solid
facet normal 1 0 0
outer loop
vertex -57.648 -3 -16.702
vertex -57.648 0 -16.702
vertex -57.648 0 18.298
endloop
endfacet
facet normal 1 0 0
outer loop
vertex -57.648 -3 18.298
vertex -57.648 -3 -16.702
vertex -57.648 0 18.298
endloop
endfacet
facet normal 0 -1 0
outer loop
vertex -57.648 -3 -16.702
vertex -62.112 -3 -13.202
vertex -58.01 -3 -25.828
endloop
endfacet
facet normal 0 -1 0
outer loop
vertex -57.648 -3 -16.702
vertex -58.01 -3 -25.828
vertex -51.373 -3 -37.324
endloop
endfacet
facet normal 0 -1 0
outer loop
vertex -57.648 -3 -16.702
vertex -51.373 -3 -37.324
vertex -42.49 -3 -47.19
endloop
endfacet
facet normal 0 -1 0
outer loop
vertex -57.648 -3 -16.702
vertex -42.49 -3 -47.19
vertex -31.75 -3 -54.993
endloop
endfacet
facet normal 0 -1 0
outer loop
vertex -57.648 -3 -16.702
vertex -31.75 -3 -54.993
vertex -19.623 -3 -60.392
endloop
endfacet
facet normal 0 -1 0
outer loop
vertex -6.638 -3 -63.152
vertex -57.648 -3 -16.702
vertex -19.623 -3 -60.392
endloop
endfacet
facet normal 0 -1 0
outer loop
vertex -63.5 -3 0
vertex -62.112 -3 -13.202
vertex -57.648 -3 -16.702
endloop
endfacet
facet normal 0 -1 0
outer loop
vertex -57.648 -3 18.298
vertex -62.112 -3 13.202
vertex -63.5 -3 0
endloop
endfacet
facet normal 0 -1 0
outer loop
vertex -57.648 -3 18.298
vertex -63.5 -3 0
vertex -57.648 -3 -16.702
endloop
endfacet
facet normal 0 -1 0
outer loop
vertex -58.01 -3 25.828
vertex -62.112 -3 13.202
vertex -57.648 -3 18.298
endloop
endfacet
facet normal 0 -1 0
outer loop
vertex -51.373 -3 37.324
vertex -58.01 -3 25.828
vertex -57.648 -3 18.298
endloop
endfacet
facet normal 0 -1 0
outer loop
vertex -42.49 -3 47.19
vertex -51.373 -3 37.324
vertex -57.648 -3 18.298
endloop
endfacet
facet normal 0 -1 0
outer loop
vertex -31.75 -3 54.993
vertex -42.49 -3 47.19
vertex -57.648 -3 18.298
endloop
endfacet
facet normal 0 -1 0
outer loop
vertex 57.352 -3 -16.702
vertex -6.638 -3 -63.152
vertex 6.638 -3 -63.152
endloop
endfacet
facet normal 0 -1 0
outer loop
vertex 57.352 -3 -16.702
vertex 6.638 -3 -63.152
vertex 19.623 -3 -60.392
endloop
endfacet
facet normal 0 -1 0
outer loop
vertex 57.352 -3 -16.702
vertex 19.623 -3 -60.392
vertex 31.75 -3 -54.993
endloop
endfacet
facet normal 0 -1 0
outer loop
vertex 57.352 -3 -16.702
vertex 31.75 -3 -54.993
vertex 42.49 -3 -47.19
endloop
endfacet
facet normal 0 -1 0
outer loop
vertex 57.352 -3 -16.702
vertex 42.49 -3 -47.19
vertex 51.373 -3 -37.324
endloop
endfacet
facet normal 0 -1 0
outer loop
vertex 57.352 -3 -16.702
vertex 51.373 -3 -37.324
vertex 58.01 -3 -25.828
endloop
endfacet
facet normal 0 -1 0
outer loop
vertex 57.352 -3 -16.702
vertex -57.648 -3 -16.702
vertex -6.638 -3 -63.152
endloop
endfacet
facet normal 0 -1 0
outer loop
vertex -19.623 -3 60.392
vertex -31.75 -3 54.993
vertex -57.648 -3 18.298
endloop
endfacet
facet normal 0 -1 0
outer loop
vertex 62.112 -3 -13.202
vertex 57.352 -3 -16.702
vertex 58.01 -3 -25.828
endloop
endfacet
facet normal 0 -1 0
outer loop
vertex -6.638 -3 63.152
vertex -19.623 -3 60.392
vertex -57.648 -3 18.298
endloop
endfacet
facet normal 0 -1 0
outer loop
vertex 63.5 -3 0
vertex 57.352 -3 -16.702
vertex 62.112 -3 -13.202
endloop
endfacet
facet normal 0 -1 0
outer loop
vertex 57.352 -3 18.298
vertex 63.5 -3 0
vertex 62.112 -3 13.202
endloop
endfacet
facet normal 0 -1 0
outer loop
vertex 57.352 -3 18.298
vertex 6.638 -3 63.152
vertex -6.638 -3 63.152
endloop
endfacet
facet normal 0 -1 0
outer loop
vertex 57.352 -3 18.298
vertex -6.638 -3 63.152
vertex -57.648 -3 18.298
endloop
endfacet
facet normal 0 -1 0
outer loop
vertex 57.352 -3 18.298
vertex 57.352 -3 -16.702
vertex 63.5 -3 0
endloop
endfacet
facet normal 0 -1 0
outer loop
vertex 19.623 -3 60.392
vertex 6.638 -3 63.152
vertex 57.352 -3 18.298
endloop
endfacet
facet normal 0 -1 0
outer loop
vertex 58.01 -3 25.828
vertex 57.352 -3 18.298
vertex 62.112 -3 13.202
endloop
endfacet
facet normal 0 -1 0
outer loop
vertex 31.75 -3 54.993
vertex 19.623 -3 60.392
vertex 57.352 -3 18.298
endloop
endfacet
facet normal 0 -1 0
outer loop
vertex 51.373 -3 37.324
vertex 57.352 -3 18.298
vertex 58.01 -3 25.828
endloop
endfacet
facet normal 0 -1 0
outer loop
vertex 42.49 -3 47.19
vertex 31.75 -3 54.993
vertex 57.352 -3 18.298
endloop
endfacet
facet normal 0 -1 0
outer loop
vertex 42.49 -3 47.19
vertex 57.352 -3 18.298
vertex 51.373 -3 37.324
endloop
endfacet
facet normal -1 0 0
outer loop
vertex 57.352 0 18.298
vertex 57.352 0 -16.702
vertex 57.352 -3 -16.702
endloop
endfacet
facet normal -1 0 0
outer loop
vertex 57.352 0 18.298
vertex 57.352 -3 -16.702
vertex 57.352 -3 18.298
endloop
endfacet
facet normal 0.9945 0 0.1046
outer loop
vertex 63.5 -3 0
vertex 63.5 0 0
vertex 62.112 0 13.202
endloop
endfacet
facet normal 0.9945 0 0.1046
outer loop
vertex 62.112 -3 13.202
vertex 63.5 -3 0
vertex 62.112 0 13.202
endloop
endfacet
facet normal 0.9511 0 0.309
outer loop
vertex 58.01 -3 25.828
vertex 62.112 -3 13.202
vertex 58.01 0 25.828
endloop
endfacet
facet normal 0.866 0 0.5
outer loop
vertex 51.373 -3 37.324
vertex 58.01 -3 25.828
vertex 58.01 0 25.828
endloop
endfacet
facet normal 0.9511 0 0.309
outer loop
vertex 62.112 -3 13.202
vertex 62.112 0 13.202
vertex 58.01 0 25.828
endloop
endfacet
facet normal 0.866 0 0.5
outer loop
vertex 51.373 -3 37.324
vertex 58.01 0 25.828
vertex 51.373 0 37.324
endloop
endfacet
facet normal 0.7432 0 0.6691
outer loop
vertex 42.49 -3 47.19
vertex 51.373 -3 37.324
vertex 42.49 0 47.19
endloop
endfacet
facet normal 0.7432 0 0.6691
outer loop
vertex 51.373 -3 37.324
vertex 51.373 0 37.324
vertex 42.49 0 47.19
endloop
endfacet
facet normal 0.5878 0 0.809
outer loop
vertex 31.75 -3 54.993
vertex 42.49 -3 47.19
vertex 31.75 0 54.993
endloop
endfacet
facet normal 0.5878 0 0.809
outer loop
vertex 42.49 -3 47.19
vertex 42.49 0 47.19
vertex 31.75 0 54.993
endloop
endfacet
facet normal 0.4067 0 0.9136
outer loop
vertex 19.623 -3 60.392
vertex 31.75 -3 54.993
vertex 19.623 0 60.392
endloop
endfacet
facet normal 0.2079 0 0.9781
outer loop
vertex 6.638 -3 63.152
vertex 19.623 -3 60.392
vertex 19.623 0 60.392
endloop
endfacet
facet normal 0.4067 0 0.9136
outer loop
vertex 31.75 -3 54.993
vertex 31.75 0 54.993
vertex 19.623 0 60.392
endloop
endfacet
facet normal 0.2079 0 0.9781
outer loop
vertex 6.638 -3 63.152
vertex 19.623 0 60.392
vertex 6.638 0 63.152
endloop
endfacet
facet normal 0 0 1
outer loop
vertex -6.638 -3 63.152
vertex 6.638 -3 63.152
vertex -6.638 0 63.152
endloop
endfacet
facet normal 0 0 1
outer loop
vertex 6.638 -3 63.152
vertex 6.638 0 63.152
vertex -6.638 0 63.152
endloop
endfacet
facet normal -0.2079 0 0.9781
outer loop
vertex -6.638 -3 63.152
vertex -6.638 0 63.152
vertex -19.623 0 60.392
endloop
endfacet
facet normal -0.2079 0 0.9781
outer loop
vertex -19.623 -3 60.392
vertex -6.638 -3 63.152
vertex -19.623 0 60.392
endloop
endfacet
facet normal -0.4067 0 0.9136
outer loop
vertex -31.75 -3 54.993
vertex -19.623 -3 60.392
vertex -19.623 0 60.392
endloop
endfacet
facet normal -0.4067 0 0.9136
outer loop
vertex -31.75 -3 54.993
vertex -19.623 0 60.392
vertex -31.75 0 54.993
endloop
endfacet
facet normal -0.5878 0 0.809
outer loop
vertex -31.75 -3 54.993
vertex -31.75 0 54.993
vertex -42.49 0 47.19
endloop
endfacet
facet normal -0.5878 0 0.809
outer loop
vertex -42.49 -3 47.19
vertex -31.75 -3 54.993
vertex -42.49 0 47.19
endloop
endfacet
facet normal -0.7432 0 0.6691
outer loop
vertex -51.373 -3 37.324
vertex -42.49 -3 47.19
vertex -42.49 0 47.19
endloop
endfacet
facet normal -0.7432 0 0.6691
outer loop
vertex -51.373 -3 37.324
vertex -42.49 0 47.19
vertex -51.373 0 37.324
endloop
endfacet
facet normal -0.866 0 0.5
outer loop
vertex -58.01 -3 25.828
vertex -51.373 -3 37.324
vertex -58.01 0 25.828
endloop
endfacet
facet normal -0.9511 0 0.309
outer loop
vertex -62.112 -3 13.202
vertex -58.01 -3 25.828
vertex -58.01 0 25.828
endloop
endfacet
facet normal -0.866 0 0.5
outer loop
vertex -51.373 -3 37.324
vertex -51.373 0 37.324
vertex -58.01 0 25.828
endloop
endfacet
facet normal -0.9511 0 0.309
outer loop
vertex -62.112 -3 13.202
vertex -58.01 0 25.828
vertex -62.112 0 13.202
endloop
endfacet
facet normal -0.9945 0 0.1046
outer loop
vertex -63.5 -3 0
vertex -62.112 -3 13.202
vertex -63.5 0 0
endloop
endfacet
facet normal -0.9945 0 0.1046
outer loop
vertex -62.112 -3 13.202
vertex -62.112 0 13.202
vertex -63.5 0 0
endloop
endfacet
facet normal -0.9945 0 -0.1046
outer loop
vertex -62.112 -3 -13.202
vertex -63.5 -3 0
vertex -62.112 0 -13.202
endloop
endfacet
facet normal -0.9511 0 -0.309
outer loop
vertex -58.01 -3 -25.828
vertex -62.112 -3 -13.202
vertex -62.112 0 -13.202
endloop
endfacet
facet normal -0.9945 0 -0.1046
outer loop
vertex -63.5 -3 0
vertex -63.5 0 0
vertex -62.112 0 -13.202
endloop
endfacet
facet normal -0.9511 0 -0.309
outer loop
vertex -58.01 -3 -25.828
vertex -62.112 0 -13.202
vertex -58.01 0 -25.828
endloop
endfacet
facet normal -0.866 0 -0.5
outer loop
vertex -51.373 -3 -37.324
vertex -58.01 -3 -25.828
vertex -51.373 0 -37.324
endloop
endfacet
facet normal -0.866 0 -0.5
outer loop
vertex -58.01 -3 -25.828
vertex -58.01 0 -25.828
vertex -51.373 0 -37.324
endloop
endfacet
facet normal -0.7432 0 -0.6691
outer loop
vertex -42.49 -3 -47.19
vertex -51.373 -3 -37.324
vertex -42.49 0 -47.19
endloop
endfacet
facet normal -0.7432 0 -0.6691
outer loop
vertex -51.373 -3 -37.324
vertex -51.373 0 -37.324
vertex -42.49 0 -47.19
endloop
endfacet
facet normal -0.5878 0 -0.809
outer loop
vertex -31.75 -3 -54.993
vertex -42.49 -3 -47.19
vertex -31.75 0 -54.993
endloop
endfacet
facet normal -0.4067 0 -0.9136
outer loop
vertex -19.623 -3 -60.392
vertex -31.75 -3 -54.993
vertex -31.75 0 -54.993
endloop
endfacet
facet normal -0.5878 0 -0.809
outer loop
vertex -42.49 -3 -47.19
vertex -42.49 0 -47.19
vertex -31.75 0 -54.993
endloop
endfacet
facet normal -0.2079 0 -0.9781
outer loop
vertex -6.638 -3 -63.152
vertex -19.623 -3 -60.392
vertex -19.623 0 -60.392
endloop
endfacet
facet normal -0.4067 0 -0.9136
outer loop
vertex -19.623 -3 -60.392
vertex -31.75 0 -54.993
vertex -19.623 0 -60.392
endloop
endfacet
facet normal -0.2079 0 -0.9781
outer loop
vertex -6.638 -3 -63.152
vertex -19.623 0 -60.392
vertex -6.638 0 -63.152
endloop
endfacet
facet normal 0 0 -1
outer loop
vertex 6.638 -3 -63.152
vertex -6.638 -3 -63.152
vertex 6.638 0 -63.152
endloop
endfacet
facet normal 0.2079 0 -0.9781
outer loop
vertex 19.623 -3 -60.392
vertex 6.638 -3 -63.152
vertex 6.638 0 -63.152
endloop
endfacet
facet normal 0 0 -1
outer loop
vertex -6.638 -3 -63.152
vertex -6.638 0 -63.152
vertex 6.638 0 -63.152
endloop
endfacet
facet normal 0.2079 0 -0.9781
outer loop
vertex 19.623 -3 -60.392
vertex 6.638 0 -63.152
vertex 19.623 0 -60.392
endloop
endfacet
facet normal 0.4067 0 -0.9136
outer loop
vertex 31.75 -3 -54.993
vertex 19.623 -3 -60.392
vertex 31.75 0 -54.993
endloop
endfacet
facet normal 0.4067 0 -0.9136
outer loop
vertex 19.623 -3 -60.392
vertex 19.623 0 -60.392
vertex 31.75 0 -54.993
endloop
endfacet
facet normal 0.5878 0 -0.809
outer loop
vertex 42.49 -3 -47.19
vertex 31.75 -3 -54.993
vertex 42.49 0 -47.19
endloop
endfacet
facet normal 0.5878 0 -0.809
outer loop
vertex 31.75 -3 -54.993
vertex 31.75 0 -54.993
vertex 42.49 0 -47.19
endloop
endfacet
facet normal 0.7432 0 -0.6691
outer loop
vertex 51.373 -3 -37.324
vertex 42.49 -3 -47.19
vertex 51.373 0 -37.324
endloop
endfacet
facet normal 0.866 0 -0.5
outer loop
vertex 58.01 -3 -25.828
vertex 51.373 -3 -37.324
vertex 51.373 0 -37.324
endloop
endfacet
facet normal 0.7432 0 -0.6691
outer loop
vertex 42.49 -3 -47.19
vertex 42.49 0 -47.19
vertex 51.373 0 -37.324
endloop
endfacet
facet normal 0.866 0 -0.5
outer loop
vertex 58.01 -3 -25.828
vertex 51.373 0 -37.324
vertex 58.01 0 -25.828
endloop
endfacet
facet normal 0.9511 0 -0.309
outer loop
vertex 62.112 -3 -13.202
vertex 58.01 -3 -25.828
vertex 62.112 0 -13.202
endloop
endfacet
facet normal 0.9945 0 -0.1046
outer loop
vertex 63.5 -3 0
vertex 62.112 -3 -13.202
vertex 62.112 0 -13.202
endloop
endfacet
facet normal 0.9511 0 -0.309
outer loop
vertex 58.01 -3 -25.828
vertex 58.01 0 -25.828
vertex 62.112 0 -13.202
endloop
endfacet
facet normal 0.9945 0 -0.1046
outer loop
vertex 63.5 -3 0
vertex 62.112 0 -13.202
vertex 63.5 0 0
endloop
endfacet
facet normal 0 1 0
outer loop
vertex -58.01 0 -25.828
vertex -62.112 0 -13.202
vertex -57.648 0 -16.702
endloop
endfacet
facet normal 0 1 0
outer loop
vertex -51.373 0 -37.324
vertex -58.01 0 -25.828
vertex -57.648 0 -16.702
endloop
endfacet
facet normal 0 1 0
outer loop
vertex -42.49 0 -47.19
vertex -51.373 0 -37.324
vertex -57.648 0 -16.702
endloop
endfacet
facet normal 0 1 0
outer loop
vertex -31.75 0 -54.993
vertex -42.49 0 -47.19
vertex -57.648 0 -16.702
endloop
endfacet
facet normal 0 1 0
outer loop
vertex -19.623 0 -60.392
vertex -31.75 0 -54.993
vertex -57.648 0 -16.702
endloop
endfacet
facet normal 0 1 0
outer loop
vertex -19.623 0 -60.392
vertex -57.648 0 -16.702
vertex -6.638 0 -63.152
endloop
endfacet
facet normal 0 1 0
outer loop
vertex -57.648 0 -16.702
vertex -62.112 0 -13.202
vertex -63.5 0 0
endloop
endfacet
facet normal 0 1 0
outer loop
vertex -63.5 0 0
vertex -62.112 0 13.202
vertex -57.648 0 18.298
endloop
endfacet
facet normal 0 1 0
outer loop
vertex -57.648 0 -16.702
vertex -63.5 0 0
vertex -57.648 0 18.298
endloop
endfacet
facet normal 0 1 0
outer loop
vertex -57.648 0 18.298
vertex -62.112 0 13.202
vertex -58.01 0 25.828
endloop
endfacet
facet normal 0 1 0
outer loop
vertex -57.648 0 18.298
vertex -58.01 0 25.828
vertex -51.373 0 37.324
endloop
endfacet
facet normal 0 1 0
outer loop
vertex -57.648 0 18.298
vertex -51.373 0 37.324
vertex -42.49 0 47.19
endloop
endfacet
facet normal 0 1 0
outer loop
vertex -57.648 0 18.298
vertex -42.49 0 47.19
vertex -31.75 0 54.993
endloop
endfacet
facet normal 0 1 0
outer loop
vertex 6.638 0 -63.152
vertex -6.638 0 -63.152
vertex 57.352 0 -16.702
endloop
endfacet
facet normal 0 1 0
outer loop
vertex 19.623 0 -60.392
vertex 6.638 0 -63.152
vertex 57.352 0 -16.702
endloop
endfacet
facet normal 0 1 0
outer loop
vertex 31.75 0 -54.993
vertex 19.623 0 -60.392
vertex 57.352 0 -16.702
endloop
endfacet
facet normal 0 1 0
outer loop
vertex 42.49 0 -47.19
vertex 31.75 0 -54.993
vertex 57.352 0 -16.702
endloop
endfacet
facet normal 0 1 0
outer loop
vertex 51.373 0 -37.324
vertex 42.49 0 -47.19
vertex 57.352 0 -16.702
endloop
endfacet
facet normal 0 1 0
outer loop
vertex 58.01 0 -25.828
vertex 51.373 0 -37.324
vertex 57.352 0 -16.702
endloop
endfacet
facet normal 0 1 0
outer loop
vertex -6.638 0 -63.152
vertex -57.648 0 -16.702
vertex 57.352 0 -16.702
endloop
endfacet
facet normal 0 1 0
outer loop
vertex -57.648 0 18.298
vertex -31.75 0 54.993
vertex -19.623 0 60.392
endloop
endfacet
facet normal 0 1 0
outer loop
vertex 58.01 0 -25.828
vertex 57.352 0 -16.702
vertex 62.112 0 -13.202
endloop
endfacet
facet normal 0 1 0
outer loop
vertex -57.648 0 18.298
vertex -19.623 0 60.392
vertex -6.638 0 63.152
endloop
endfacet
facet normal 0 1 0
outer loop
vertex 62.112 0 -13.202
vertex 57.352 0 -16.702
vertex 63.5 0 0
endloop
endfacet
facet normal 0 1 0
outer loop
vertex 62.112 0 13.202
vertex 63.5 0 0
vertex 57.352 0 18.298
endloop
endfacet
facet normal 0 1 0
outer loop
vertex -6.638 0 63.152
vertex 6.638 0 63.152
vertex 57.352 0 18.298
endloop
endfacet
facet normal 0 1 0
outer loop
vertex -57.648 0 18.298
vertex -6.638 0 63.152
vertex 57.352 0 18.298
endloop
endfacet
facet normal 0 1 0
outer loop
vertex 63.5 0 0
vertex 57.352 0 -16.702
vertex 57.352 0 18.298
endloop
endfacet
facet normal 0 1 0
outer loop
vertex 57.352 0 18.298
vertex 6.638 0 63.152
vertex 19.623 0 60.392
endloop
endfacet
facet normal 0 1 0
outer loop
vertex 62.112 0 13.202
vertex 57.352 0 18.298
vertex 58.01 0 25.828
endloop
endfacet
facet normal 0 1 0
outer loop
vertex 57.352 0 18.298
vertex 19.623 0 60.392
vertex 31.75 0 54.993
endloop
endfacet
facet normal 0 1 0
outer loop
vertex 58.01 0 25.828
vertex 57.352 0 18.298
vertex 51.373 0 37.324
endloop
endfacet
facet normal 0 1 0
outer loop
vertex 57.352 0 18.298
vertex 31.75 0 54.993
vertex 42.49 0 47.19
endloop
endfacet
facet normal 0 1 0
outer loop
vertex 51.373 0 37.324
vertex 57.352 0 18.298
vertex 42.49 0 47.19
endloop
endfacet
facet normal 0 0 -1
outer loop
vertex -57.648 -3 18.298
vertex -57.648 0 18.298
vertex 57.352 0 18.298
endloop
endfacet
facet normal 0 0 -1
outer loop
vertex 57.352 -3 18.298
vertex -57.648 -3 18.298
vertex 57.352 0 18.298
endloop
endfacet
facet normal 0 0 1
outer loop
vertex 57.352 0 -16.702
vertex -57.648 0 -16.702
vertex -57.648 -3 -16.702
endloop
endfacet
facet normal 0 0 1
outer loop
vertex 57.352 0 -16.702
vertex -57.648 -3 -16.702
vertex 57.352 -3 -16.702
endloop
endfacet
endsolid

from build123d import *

# Parameters (mm, degrees)
F0_R     = 63.5
F1_DEPTH = 3
F2_W     = 115
F2_H     = 35
F3_DEPTH = 3


with BuildPart() as f1:
    # F0 (on Front) → F1 (new body)
    with BuildSketch(Plane.XZ):
        Circle(F0_R)
    extrude(amount=F1_DEPTH)

    # F2 (on Front) → F3 (cut)
    with BuildSketch(Plane.XZ):
        with Locations((-0.148186, 0.797595)):
            Rectangle(F2_W, F2_H)
    extrude(amount=F3_DEPTH, mode=Mode.SUBTRACT)


solid = f1.part
